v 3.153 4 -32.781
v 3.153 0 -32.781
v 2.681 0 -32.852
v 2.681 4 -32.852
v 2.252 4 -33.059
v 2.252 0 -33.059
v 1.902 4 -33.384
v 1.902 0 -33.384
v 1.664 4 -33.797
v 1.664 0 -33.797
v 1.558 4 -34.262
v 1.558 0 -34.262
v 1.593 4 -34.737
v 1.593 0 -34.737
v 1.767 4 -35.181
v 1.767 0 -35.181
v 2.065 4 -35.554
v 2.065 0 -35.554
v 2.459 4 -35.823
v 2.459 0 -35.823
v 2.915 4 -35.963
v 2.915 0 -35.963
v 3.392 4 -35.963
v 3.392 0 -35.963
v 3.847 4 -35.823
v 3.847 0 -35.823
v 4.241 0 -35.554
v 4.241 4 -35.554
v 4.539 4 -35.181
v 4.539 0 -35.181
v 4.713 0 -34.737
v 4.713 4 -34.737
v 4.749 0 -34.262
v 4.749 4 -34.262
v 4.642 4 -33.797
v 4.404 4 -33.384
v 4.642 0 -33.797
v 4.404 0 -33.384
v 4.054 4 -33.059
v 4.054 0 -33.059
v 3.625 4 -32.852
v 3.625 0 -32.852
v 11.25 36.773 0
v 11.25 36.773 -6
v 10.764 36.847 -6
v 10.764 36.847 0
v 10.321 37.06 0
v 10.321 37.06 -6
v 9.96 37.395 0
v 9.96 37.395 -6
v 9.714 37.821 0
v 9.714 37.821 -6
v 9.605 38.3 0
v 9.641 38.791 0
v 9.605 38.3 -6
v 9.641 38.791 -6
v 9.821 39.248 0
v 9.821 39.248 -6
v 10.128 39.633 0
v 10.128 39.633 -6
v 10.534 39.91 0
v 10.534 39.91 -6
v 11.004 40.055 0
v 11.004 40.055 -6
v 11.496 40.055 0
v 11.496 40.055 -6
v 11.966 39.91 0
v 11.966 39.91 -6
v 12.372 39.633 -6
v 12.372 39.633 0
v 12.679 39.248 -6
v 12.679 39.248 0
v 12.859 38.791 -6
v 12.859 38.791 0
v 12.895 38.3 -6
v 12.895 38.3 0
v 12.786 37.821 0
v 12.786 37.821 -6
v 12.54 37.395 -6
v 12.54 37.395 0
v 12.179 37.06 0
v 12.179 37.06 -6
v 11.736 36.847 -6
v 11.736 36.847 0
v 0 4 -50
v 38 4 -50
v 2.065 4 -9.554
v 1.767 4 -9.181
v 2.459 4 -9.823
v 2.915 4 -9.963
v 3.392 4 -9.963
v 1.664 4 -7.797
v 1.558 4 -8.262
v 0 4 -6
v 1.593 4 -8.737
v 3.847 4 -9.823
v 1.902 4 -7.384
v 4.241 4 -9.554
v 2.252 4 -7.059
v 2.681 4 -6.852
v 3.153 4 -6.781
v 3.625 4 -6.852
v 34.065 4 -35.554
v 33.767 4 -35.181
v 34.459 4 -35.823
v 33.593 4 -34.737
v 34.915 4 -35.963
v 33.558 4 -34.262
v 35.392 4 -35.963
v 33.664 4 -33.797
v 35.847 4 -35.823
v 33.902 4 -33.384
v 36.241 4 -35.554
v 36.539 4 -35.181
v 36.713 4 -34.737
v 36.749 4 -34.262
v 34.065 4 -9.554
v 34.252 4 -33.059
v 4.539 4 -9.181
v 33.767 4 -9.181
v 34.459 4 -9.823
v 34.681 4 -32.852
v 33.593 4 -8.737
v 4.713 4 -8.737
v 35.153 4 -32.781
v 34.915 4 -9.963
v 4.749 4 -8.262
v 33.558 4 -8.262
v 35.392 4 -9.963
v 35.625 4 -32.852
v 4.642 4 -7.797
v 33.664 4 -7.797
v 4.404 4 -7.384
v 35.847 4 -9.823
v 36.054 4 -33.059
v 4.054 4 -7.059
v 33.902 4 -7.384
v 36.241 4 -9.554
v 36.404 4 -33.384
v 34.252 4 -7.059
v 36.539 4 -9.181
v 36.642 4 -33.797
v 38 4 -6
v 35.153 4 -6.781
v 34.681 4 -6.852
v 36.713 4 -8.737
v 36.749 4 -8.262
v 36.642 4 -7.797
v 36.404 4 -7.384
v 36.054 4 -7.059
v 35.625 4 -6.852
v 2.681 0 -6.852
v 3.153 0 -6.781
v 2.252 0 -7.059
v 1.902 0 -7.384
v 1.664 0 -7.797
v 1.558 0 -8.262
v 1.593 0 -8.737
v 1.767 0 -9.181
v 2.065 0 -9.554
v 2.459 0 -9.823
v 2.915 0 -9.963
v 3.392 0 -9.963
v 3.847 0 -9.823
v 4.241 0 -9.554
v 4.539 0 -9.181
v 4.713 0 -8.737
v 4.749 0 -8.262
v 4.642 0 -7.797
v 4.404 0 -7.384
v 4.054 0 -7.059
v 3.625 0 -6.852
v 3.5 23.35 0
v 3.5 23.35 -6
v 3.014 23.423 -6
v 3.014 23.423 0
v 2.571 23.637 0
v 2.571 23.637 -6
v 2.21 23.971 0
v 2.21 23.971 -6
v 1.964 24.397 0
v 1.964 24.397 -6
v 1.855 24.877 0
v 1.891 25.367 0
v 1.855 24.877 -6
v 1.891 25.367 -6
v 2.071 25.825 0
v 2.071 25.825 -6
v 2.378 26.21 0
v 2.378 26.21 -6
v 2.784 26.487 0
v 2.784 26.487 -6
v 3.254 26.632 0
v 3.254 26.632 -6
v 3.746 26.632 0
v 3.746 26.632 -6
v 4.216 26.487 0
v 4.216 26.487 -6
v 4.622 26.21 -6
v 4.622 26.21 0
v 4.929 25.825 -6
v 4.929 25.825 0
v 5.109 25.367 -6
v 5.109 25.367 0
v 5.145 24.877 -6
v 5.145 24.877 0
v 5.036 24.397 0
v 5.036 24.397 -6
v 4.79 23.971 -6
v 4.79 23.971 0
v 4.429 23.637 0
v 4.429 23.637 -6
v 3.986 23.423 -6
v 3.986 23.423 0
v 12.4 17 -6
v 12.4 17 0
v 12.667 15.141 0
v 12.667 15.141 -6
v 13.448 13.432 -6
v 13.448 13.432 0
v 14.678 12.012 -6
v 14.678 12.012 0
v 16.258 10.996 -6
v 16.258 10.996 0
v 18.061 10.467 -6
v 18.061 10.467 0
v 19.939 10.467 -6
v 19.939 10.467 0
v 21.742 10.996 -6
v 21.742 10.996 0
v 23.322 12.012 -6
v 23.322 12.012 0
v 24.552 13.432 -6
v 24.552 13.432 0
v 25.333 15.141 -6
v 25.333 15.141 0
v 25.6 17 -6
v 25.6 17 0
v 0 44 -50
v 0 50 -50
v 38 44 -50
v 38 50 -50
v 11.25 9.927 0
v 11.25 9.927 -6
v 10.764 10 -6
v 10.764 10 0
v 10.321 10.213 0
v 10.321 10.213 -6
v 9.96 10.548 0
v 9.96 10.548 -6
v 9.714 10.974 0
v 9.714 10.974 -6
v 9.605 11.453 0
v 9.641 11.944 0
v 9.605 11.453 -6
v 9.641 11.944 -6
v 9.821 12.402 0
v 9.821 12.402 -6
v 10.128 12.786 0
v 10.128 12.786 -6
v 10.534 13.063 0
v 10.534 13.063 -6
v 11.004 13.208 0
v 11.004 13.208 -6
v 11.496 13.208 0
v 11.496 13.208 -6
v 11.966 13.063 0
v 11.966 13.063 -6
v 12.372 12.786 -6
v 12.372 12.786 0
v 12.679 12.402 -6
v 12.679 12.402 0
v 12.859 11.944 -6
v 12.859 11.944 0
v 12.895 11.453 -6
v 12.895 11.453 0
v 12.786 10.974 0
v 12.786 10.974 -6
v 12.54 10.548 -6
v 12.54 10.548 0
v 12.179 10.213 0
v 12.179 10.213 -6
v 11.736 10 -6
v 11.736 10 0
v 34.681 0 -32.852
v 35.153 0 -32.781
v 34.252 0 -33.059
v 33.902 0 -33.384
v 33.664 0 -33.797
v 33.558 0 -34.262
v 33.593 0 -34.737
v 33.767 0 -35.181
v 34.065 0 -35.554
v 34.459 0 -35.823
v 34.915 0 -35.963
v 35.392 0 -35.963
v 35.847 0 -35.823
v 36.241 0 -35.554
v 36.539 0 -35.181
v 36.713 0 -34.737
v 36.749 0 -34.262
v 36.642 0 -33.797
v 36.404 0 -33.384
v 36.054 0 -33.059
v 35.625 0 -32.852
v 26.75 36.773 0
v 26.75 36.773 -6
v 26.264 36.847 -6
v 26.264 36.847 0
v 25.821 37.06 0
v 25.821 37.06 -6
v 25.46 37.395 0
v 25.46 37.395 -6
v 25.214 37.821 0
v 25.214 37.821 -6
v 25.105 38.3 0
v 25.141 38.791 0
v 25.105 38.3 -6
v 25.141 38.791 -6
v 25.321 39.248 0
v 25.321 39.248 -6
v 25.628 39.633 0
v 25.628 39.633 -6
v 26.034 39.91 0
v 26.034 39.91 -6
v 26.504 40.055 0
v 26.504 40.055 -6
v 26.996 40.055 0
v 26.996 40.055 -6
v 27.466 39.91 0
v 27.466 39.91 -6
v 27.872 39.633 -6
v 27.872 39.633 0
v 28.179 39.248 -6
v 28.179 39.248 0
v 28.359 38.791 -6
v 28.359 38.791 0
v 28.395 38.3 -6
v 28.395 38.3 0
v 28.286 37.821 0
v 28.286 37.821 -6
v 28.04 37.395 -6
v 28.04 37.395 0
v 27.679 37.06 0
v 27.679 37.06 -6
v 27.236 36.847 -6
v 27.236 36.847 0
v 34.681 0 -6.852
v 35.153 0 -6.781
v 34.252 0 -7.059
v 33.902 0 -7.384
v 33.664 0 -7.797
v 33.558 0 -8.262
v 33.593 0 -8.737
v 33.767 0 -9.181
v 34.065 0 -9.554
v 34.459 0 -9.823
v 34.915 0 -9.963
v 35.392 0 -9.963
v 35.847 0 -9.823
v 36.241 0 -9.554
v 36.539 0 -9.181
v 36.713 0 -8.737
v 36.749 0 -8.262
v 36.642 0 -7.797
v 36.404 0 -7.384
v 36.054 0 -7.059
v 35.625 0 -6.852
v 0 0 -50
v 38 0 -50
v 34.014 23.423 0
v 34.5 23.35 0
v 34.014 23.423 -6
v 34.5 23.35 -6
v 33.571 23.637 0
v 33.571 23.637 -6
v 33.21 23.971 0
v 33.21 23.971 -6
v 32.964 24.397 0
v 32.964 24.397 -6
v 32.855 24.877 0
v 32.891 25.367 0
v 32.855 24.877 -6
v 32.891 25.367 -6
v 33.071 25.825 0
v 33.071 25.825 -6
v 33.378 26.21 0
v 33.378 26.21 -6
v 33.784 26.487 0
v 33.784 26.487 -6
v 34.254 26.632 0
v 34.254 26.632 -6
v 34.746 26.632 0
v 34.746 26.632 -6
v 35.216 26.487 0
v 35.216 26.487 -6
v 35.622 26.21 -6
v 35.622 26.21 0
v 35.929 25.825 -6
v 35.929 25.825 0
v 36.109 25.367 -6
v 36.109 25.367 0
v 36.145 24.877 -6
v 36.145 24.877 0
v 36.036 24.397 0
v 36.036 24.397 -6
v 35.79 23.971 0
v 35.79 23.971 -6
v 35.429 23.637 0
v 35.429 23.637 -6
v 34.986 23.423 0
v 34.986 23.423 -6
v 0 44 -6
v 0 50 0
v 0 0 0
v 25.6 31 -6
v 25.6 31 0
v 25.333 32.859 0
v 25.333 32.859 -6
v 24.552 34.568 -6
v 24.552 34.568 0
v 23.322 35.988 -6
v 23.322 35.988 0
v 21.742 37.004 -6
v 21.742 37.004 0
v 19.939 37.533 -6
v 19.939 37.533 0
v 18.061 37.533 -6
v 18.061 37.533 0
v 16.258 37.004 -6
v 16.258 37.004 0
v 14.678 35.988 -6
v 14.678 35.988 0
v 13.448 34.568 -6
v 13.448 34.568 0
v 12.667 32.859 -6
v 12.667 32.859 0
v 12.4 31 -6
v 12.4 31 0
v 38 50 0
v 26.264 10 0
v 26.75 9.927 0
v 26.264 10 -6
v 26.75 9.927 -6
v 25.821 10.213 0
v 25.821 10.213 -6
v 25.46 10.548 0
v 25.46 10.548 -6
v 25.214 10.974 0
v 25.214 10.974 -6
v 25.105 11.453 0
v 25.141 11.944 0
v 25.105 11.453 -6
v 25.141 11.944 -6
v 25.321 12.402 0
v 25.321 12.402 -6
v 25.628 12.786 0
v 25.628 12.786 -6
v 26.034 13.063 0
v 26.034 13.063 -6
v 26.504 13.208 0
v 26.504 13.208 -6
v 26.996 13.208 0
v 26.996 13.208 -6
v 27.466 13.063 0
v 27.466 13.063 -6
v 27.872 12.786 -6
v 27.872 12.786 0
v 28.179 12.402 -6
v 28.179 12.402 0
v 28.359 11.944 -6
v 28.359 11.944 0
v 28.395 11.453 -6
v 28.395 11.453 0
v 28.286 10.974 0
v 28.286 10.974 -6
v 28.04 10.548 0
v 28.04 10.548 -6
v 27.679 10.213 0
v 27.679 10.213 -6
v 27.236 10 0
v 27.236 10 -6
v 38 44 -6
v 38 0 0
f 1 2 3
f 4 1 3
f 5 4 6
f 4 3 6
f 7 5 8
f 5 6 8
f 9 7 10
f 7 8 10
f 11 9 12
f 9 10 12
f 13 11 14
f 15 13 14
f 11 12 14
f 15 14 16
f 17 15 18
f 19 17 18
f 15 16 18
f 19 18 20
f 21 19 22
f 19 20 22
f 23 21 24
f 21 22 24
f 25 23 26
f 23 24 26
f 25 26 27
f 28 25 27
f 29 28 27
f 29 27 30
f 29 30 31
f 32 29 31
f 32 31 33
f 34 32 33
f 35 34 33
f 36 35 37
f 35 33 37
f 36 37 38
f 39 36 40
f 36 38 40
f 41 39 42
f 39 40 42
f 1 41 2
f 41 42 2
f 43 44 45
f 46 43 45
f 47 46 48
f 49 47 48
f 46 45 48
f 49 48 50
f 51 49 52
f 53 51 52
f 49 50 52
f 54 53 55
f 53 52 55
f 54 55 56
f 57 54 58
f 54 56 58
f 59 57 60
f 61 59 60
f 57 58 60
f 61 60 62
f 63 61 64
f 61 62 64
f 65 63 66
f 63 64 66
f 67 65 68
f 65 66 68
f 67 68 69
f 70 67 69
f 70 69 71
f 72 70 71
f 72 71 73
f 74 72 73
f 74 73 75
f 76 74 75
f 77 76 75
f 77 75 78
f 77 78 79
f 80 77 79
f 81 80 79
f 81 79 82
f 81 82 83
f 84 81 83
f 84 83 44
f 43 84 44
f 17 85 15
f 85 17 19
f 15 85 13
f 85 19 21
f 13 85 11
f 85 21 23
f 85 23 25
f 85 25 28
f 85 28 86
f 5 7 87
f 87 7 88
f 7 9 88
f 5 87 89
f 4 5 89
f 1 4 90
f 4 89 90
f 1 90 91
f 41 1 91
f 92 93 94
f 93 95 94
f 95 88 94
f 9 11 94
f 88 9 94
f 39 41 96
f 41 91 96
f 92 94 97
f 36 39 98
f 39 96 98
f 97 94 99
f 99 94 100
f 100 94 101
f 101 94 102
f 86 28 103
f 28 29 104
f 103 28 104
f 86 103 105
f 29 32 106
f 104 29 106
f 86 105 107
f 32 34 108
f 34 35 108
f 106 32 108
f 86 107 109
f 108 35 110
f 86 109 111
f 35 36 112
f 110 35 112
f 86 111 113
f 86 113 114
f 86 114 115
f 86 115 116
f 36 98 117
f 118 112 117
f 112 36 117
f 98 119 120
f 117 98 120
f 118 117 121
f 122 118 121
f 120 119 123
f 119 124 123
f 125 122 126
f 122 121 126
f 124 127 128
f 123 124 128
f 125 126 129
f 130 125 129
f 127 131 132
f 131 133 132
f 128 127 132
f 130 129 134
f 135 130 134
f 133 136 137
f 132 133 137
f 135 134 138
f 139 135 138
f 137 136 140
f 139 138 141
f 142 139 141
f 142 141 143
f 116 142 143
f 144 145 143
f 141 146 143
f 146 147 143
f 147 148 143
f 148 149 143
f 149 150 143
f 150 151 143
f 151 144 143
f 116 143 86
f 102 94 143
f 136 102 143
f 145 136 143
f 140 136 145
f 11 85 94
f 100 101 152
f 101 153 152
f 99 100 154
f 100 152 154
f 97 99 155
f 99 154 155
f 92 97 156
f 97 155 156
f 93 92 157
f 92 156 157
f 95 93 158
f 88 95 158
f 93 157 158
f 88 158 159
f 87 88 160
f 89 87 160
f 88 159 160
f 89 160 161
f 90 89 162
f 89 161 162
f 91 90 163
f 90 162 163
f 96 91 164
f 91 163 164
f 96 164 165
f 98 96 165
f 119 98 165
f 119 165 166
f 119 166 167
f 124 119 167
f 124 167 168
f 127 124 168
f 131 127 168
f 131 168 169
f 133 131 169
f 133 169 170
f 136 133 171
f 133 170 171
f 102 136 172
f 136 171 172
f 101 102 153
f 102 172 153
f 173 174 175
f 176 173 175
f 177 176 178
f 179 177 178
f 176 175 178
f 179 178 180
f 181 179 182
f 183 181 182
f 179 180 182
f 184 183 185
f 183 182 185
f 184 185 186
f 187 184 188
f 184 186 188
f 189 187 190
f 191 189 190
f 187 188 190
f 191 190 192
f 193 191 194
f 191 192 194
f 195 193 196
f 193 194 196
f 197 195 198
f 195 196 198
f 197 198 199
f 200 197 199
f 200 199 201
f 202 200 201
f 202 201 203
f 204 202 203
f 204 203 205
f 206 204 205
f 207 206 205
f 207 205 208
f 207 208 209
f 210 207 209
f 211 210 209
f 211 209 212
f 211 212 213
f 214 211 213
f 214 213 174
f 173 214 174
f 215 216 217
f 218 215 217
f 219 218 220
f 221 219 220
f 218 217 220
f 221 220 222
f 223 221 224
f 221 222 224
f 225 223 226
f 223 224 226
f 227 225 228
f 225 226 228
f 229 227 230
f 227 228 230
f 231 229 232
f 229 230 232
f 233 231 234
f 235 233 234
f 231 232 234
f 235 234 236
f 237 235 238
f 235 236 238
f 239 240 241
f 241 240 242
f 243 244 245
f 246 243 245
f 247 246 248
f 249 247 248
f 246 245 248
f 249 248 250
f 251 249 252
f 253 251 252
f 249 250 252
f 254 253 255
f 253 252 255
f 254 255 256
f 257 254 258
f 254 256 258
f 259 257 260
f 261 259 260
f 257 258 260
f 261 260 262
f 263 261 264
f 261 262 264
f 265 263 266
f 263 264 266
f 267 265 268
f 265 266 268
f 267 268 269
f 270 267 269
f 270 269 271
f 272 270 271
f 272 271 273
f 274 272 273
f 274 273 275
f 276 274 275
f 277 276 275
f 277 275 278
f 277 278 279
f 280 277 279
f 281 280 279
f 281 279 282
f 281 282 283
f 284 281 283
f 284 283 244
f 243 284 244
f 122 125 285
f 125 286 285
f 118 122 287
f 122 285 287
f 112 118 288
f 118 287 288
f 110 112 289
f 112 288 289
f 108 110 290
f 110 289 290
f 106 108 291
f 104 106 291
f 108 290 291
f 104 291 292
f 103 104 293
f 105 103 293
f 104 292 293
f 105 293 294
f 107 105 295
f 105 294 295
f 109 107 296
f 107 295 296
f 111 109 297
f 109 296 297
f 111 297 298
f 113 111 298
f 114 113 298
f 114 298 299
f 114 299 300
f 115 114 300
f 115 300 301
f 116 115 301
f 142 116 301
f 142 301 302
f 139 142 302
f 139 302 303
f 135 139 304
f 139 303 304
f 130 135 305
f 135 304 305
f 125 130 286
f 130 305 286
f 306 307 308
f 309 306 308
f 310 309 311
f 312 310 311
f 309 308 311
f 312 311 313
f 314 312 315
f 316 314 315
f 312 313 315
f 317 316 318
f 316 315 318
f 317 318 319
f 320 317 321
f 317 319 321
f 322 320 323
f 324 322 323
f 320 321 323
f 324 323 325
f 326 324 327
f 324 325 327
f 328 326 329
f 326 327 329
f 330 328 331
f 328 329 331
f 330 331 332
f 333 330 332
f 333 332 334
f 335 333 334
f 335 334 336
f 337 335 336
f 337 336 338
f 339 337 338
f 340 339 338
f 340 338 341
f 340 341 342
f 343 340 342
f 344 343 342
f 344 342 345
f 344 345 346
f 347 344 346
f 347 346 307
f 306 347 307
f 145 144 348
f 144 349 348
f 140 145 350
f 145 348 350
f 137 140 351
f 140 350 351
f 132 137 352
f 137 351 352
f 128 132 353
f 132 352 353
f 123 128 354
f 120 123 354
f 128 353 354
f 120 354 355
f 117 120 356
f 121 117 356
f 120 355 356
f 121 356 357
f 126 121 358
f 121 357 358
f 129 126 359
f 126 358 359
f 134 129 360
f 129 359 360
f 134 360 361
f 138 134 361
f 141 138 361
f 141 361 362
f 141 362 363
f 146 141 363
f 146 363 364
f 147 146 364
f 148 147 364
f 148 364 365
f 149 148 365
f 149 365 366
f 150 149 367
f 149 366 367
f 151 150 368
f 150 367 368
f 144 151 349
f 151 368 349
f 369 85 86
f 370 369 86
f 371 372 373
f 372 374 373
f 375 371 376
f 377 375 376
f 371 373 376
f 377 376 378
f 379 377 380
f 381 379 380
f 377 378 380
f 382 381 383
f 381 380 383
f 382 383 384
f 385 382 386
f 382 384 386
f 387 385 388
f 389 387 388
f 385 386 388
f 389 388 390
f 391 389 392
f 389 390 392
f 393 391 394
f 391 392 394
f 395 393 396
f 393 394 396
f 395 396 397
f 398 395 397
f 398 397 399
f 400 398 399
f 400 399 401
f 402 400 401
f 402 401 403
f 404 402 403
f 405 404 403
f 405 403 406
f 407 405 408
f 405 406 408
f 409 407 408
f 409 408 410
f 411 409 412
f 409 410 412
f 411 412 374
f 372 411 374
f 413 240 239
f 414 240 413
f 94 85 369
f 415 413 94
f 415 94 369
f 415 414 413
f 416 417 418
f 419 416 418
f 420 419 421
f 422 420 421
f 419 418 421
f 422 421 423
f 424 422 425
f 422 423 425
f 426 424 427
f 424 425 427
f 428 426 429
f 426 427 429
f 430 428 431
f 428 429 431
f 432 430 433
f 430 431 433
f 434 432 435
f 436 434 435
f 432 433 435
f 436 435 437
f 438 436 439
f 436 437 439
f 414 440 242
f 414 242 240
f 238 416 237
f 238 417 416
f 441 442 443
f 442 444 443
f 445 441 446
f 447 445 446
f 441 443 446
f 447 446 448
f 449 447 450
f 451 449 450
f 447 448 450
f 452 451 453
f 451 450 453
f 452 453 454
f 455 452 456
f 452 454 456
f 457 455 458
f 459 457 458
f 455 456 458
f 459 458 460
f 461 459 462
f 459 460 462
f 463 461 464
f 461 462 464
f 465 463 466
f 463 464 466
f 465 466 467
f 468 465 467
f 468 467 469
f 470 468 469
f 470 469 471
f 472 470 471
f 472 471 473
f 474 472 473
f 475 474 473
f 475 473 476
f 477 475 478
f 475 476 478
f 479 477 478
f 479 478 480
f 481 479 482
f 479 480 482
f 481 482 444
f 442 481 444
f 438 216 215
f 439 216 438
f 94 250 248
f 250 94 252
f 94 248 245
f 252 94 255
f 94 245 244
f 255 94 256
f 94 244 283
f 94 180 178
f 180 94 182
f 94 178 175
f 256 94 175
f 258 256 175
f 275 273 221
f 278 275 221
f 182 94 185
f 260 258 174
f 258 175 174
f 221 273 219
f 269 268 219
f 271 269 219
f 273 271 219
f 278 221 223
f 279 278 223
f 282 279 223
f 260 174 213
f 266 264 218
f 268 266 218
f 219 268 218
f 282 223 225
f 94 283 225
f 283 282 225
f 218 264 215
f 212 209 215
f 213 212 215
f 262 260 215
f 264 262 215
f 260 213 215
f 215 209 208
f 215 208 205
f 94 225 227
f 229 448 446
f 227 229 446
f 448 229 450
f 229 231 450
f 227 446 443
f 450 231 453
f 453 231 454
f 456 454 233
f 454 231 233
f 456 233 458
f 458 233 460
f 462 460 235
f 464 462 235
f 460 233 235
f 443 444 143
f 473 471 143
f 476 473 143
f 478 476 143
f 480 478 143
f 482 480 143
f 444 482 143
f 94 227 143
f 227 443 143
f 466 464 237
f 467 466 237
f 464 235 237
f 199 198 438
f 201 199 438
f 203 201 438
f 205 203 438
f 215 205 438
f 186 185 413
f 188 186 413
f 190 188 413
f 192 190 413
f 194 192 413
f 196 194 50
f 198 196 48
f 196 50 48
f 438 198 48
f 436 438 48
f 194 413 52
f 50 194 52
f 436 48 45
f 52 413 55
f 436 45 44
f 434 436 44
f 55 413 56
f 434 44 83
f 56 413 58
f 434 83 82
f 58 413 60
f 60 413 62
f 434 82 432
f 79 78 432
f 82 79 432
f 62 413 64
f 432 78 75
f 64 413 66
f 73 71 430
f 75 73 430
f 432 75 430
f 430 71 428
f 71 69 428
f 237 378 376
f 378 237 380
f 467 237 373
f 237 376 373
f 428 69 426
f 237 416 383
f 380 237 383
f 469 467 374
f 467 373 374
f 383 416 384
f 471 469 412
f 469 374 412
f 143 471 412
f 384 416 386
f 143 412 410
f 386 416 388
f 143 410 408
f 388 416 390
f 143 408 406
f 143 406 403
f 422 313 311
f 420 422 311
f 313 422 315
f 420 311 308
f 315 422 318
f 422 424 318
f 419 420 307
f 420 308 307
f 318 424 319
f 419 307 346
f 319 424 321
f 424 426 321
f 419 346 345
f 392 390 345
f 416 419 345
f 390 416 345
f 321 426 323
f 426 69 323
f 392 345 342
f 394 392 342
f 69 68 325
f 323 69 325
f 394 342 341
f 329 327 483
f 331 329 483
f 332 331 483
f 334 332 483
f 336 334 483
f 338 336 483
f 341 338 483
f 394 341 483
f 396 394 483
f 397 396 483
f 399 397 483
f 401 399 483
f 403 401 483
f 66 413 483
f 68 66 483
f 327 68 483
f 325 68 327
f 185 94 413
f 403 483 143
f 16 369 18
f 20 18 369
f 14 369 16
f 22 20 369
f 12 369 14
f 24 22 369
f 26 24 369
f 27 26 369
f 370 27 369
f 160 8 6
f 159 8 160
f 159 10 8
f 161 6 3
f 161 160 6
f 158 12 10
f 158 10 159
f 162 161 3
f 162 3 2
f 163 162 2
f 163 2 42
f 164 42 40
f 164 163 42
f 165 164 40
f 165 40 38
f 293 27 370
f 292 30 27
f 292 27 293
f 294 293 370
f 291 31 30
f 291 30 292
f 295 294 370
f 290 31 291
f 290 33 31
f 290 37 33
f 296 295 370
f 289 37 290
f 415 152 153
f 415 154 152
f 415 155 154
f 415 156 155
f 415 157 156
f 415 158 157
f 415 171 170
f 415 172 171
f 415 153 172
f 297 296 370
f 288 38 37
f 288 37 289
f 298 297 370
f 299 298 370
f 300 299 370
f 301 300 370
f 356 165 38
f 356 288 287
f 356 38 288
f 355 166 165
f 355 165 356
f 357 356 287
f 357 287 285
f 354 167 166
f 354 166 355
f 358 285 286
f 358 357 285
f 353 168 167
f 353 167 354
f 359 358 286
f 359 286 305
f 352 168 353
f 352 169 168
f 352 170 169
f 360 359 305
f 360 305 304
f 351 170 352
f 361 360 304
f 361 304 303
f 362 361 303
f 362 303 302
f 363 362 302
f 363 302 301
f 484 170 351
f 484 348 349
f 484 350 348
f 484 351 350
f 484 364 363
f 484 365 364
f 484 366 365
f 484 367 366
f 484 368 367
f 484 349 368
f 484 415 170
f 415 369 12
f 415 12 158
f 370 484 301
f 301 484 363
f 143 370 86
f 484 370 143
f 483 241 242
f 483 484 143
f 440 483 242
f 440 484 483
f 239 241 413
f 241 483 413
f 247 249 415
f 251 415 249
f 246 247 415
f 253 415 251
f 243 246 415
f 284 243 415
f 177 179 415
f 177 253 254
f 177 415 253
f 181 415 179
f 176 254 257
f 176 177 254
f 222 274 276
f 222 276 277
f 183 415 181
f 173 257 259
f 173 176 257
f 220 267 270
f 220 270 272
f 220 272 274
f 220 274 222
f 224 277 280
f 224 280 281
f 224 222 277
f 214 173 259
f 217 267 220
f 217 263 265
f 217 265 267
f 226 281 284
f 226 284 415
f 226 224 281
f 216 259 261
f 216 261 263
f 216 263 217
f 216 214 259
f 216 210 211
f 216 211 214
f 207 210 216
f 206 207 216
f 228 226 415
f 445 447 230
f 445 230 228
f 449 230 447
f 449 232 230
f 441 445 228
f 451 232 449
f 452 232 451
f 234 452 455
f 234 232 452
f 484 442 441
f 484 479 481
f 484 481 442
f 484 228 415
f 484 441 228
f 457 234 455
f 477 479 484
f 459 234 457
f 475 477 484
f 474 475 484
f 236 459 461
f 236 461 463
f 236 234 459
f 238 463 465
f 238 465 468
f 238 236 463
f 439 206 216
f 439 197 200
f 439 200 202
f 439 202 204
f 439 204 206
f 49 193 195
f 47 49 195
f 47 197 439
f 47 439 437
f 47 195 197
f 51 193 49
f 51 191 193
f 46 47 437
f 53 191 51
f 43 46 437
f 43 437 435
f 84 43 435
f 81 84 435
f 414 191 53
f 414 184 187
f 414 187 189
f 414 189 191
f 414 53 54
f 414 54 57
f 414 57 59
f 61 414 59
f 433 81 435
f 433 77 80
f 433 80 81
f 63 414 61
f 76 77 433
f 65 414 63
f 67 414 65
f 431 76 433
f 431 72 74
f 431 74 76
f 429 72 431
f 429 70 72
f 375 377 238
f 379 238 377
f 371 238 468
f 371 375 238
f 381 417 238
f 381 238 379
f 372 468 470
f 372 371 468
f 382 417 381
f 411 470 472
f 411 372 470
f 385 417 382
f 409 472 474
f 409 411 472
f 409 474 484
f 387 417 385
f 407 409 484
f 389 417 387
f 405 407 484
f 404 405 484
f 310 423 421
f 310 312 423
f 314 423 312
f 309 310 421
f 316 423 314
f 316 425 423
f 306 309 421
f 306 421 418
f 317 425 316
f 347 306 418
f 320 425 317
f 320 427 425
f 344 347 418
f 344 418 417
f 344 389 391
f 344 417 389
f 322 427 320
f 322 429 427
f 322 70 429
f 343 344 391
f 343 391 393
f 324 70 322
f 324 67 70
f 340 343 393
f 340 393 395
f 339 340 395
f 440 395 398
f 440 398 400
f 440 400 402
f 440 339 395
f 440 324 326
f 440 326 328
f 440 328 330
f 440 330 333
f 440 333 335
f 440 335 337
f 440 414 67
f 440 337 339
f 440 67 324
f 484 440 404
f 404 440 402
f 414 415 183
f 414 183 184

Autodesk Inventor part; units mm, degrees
ref_plane "YZ Plane" through (0, 0, 0) normal (1, 0, 0) x (0, 1, 0)
ref_plane "XZ Plane" through (0, 0, 0) normal (0, 1, 0) x (-1, 0, 0)
ref_plane "XY Plane" through (0, 0, 0) normal (0, 0, 1) x (1, 0, 0)
sketch "スケッチ1" plane through (0, 0, 0) normal (0, 0, 1) x (1, 0, 0)
  line L0 (0, 0) -> (38, 0)
  line L1 (38, 0) -> (38, 24)
  line L2 (38, 24) -> (0, 24)
  line L3 (0, 24) -> (0, 0)
  line L4 (0, 4) -> (38, 4)
  line L5 (12.4, 31) -> (25.6, 31)
  line L6 (25.6, 31) -> (25.6, 17)
  line L7 (25.6, 17) -> (12.4, 17)
  line L8 (12.4, 17) -> (12.4, 31)
  arc A0 (25.6, 31) -> (12.4, 31) centre (19, 31) ccw
  arc A1 (12.4, 17) -> (25.6, 17) centre (19, 17) ccw
  line L9 (0, 24) -> (38, 24)
  line L10 (38, 24) -> (38, 44)
  line L11 (38, 44) -> (0, 44)
  line L12 (0, 44) -> (0, 24)
  line L13 (0, 44) -> (38, 44)
  line L14 (38, 44) -> (38, 50)
  line L15 (38, 50) -> (0, 50)
  line L16 (0, 50) -> (0, 44)
  point P0 (19, 24)
  point P1 (19, 39.6)
  point P2 (25.6, 24)
  point P3 (12.4, 24)
  dimension "d0" = 38
  dimension "d1" = 24
  dimension "d2" = 4
  dimension "d3" = 15.6
  dimension "d4" = 13.2
  dimension "d5" = 14
  dimension "d6" = 7
  dimension "d7" = 19
  dimension "d49" = 6
  dimension "d50" = 38
  dimension "d51" = 20
  dimension "d52" = 38
extrude "押し出し1" add sketch "スケッチ1" against normal blind 6 contours L3 L4 L1 L0 | L3 L2 L8 A1 L6 L1 L4 | L12 L11 L10 L2 L6 A0 L8 | L16 L15 L14 L11
extrude "押し出し2" add sketch "スケッチ1" against normal blind 50 contours L3 L4 L1 L0 | L16 L15 L14 L11
sketch "スケッチ2" plane through (0, 0, 0) normal (0, 0, 1) x (1, 0, 0)
  line L0 (0, 50) -> (0, 0) projected
  line L1 (38, 50) -> (0, 50) projected
  point P0 (3.5, 25)
  point P1 (19, 25)
  point P2 (11.25, 11.5766)
  point P3 (26.75, 11.5766)
  point P4 (34.5, 25)
  point P5 (26.75, 38.4234)
  point P6 (11.25, 38.4234)
  point P7 (0, 25)
  point P8 (19, 43.6)
  point P9 (0, 25)
  point P10 (19, 50)
  dimension "d16" = 360
  dimension "d18" = 15.5
hole "穴1" at (3.5, 25, 0) at (19, 25, 0) at (11.25, 11.5766, 0) at (26.75, 11.5766, 0) at (34.5, 25, 0) at (26.75, 38.4234, 0) at (11.25, 38.4234, 0) direction (0, 0, -1) diameter 3.3 depth 8.1 tip angle 118
sketch "スケッチ4" plane through (0, 4, -6) normal (0, 1, 0) x (1, 0, 0)
  point P0 (0, -6)
  point P1 (3.1531, 2.3812)
  point P2 (35.1531, 2.3812)
  point P3 (35.1531, 28.3812)
  point P4 (3.1531, 28.3812)
  dimension "d47" = 32
  dimension "d48" = 26
hole "穴3" at (3.1531, 4, -8.3812) at (35.1531, 4, -8.3812) at (35.1531, 4, -34.3812) at (3.1531, 4, -34.3812) direction (0, -1, 0) diameter 3.2 depth 8.1 tip angle 118
equation "\"d7\" = 0.5 * d0"
equation "\"d51\" = d1 - d2"
properties part number "ギアボックス"
